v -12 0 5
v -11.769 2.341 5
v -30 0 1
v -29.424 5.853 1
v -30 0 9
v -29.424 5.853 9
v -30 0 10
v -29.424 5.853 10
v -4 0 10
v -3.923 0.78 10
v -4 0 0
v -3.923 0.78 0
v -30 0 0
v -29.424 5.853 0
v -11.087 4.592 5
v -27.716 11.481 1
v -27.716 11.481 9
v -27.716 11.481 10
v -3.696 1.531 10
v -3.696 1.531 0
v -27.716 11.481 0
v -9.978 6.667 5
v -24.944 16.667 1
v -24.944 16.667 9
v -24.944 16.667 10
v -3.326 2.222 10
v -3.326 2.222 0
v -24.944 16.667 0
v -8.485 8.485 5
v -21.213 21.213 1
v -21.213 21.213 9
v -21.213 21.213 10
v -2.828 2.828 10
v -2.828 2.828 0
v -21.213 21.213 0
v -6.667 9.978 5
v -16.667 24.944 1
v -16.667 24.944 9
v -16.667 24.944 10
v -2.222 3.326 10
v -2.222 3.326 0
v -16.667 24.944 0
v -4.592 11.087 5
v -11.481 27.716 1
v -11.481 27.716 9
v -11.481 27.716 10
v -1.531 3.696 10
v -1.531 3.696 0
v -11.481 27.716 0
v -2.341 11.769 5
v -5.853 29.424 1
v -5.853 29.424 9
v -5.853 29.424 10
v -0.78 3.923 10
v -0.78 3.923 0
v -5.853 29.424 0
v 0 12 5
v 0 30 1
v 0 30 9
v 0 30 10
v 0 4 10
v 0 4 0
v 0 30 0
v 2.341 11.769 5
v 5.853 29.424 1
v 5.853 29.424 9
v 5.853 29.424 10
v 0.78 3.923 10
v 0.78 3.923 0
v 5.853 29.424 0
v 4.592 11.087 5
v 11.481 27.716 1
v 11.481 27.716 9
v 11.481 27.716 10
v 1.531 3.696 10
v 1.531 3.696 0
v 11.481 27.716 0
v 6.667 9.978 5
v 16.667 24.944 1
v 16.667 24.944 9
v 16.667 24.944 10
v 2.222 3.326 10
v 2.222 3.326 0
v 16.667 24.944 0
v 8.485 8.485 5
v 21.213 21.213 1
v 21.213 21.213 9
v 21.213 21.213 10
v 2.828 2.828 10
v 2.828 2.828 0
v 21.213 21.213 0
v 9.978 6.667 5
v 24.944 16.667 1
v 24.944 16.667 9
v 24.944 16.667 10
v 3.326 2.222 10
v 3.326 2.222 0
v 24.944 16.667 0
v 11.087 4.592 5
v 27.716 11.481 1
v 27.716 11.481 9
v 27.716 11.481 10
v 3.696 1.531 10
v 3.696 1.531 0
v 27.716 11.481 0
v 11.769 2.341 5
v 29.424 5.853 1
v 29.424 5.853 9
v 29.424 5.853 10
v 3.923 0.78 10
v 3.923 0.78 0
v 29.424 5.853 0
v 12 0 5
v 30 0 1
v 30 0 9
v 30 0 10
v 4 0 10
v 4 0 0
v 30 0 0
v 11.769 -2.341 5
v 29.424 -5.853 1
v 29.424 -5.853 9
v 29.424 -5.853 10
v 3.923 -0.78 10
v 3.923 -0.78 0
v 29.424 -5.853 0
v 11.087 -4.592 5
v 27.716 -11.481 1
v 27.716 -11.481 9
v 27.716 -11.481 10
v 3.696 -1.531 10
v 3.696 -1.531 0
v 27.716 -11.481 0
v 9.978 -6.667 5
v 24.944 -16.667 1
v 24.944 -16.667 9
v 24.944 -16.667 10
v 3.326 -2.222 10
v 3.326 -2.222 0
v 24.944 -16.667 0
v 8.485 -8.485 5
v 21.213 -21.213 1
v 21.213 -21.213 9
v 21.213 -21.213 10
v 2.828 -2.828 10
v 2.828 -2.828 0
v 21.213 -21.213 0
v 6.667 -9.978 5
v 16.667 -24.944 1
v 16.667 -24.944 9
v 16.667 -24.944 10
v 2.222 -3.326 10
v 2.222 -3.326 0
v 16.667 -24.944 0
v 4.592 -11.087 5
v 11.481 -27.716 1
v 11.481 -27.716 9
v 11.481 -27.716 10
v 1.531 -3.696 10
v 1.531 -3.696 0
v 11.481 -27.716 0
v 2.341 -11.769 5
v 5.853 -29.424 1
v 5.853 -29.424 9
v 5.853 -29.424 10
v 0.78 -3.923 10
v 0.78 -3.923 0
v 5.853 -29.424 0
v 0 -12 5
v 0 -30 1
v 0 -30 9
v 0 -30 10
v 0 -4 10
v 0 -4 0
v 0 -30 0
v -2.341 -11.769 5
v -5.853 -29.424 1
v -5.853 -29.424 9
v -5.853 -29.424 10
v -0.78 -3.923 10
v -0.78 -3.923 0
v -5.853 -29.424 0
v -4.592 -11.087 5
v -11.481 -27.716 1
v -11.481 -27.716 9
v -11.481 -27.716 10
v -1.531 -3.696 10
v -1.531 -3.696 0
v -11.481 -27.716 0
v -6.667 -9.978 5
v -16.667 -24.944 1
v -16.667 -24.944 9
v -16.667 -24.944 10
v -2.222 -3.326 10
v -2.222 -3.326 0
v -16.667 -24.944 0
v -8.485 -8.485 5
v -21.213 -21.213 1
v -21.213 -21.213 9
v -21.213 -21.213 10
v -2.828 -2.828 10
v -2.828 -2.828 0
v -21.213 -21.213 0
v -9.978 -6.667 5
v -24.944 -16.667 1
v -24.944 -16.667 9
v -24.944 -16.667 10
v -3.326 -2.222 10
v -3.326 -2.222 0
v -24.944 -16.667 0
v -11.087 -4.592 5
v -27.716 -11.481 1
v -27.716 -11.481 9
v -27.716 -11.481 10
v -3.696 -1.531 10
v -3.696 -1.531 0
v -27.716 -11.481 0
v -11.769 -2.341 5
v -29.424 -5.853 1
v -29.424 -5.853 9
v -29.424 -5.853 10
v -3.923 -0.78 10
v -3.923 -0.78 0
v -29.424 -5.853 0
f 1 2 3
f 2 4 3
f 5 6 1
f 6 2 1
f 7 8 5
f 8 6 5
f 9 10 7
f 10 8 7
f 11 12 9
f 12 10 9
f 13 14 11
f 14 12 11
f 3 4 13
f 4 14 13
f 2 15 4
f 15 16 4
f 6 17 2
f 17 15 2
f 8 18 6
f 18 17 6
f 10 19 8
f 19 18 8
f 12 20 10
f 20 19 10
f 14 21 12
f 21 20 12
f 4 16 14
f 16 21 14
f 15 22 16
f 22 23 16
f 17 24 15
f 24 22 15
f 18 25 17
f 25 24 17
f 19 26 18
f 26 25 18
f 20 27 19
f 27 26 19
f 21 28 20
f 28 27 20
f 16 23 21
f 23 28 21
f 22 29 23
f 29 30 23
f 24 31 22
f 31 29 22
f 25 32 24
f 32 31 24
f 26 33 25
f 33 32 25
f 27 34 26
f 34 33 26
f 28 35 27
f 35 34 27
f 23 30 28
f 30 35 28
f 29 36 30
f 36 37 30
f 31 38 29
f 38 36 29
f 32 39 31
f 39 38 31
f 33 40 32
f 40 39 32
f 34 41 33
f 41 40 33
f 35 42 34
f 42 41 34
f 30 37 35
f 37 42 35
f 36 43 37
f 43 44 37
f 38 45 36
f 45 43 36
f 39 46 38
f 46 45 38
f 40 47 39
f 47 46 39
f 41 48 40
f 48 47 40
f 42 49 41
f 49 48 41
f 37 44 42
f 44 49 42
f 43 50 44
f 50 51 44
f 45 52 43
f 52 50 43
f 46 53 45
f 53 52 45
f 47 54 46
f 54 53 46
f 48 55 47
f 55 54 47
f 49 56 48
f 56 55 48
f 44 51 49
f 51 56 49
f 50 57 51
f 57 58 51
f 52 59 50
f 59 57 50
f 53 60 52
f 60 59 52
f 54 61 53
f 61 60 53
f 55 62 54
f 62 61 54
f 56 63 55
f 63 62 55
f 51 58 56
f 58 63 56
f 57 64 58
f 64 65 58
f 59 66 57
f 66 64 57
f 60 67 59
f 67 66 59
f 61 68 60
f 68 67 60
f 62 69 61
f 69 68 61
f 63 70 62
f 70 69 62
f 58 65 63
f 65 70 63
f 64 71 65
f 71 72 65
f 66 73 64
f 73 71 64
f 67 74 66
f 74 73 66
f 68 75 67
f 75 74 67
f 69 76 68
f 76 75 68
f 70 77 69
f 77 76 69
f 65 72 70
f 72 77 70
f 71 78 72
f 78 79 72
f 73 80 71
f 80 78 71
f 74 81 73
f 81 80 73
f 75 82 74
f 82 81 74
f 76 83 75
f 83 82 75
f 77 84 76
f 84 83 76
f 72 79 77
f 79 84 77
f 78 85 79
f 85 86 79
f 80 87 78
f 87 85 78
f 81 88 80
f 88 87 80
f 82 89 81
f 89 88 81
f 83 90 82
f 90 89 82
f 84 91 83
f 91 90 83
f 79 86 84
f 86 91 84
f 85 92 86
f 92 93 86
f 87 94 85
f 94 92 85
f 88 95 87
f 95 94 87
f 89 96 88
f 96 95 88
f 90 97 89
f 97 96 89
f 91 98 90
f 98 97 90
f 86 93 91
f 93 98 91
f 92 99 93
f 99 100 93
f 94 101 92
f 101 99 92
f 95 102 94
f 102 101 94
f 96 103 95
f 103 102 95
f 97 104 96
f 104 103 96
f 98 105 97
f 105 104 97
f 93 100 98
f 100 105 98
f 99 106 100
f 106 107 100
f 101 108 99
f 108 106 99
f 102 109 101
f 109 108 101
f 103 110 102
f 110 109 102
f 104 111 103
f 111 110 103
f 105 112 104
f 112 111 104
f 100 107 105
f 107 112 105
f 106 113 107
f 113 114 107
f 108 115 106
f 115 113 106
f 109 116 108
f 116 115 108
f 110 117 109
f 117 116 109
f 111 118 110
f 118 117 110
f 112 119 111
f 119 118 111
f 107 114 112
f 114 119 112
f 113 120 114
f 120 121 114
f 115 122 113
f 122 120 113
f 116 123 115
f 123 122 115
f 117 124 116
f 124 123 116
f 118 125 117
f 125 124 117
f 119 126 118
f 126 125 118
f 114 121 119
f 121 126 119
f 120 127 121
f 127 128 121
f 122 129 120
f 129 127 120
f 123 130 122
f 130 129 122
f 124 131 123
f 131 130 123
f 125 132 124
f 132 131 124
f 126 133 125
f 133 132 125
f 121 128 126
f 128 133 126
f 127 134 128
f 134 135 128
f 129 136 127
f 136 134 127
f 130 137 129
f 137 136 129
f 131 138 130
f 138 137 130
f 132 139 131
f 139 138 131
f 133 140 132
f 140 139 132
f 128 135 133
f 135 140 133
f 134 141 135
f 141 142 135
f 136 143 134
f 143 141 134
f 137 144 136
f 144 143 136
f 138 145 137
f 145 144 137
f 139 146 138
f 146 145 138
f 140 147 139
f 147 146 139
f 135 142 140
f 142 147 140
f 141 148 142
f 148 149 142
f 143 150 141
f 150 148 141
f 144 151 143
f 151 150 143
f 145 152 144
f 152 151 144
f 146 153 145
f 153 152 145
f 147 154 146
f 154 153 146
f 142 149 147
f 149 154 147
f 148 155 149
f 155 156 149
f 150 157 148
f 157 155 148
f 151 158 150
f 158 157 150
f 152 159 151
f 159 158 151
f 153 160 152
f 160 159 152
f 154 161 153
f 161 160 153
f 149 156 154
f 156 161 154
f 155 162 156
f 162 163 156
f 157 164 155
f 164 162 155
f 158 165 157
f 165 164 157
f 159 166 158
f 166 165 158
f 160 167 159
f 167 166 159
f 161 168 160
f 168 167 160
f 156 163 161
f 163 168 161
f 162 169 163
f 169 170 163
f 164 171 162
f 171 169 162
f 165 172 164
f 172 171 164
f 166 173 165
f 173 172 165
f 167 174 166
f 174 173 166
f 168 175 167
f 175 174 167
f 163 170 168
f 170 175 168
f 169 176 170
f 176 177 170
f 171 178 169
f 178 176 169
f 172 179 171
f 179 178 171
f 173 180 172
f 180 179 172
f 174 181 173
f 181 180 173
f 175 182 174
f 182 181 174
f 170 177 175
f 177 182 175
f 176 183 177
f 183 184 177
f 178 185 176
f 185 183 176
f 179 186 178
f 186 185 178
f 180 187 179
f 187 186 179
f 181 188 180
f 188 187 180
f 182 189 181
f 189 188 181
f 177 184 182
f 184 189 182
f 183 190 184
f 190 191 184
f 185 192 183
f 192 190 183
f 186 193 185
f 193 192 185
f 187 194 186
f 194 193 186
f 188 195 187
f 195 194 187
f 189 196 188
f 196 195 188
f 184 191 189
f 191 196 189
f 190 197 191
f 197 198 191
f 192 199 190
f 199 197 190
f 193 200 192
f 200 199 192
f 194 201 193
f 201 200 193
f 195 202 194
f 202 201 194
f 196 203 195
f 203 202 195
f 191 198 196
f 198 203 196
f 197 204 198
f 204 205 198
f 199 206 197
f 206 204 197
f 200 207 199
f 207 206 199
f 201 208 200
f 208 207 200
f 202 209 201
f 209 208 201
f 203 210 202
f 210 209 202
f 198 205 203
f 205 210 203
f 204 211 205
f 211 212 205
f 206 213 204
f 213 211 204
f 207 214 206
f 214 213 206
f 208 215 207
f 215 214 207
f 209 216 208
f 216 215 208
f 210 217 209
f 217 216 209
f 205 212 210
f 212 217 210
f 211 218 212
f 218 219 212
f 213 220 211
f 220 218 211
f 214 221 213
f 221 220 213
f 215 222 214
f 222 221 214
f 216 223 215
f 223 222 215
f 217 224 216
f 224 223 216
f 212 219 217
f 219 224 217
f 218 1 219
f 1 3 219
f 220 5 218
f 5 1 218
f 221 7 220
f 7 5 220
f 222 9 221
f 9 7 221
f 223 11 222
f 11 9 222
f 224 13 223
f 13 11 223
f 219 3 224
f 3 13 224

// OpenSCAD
$fn = 32;

// ----------------------------------------------------------------------
// Revolved part: V-groove pulley R30
// ----------------------------------------------------------------------

// --- parameters (mm) ---
bore_r = 4;               // bore radius
rim_r = 30;               // rim radius
rim_t = 10;               // rim width
groove_r = 12;            // groove root radius
groove_w = 4;             // groove half width
revolve_angle = 360;      // revolve sweep, degrees

bore_d = 2 * bore_r;
rim_d = 2 * rim_r;
groove_d = 2 * groove_r;

profile = [[4, 0], [30, 0], [30, 1], [12, 5], [30, 9], [30, 10], [4, 10]];  // primary outline, 7 points, counter clockwise

// --- the one profile operation ---
rotate_extrude(angle = revolve_angle) polygon(points = profile);
